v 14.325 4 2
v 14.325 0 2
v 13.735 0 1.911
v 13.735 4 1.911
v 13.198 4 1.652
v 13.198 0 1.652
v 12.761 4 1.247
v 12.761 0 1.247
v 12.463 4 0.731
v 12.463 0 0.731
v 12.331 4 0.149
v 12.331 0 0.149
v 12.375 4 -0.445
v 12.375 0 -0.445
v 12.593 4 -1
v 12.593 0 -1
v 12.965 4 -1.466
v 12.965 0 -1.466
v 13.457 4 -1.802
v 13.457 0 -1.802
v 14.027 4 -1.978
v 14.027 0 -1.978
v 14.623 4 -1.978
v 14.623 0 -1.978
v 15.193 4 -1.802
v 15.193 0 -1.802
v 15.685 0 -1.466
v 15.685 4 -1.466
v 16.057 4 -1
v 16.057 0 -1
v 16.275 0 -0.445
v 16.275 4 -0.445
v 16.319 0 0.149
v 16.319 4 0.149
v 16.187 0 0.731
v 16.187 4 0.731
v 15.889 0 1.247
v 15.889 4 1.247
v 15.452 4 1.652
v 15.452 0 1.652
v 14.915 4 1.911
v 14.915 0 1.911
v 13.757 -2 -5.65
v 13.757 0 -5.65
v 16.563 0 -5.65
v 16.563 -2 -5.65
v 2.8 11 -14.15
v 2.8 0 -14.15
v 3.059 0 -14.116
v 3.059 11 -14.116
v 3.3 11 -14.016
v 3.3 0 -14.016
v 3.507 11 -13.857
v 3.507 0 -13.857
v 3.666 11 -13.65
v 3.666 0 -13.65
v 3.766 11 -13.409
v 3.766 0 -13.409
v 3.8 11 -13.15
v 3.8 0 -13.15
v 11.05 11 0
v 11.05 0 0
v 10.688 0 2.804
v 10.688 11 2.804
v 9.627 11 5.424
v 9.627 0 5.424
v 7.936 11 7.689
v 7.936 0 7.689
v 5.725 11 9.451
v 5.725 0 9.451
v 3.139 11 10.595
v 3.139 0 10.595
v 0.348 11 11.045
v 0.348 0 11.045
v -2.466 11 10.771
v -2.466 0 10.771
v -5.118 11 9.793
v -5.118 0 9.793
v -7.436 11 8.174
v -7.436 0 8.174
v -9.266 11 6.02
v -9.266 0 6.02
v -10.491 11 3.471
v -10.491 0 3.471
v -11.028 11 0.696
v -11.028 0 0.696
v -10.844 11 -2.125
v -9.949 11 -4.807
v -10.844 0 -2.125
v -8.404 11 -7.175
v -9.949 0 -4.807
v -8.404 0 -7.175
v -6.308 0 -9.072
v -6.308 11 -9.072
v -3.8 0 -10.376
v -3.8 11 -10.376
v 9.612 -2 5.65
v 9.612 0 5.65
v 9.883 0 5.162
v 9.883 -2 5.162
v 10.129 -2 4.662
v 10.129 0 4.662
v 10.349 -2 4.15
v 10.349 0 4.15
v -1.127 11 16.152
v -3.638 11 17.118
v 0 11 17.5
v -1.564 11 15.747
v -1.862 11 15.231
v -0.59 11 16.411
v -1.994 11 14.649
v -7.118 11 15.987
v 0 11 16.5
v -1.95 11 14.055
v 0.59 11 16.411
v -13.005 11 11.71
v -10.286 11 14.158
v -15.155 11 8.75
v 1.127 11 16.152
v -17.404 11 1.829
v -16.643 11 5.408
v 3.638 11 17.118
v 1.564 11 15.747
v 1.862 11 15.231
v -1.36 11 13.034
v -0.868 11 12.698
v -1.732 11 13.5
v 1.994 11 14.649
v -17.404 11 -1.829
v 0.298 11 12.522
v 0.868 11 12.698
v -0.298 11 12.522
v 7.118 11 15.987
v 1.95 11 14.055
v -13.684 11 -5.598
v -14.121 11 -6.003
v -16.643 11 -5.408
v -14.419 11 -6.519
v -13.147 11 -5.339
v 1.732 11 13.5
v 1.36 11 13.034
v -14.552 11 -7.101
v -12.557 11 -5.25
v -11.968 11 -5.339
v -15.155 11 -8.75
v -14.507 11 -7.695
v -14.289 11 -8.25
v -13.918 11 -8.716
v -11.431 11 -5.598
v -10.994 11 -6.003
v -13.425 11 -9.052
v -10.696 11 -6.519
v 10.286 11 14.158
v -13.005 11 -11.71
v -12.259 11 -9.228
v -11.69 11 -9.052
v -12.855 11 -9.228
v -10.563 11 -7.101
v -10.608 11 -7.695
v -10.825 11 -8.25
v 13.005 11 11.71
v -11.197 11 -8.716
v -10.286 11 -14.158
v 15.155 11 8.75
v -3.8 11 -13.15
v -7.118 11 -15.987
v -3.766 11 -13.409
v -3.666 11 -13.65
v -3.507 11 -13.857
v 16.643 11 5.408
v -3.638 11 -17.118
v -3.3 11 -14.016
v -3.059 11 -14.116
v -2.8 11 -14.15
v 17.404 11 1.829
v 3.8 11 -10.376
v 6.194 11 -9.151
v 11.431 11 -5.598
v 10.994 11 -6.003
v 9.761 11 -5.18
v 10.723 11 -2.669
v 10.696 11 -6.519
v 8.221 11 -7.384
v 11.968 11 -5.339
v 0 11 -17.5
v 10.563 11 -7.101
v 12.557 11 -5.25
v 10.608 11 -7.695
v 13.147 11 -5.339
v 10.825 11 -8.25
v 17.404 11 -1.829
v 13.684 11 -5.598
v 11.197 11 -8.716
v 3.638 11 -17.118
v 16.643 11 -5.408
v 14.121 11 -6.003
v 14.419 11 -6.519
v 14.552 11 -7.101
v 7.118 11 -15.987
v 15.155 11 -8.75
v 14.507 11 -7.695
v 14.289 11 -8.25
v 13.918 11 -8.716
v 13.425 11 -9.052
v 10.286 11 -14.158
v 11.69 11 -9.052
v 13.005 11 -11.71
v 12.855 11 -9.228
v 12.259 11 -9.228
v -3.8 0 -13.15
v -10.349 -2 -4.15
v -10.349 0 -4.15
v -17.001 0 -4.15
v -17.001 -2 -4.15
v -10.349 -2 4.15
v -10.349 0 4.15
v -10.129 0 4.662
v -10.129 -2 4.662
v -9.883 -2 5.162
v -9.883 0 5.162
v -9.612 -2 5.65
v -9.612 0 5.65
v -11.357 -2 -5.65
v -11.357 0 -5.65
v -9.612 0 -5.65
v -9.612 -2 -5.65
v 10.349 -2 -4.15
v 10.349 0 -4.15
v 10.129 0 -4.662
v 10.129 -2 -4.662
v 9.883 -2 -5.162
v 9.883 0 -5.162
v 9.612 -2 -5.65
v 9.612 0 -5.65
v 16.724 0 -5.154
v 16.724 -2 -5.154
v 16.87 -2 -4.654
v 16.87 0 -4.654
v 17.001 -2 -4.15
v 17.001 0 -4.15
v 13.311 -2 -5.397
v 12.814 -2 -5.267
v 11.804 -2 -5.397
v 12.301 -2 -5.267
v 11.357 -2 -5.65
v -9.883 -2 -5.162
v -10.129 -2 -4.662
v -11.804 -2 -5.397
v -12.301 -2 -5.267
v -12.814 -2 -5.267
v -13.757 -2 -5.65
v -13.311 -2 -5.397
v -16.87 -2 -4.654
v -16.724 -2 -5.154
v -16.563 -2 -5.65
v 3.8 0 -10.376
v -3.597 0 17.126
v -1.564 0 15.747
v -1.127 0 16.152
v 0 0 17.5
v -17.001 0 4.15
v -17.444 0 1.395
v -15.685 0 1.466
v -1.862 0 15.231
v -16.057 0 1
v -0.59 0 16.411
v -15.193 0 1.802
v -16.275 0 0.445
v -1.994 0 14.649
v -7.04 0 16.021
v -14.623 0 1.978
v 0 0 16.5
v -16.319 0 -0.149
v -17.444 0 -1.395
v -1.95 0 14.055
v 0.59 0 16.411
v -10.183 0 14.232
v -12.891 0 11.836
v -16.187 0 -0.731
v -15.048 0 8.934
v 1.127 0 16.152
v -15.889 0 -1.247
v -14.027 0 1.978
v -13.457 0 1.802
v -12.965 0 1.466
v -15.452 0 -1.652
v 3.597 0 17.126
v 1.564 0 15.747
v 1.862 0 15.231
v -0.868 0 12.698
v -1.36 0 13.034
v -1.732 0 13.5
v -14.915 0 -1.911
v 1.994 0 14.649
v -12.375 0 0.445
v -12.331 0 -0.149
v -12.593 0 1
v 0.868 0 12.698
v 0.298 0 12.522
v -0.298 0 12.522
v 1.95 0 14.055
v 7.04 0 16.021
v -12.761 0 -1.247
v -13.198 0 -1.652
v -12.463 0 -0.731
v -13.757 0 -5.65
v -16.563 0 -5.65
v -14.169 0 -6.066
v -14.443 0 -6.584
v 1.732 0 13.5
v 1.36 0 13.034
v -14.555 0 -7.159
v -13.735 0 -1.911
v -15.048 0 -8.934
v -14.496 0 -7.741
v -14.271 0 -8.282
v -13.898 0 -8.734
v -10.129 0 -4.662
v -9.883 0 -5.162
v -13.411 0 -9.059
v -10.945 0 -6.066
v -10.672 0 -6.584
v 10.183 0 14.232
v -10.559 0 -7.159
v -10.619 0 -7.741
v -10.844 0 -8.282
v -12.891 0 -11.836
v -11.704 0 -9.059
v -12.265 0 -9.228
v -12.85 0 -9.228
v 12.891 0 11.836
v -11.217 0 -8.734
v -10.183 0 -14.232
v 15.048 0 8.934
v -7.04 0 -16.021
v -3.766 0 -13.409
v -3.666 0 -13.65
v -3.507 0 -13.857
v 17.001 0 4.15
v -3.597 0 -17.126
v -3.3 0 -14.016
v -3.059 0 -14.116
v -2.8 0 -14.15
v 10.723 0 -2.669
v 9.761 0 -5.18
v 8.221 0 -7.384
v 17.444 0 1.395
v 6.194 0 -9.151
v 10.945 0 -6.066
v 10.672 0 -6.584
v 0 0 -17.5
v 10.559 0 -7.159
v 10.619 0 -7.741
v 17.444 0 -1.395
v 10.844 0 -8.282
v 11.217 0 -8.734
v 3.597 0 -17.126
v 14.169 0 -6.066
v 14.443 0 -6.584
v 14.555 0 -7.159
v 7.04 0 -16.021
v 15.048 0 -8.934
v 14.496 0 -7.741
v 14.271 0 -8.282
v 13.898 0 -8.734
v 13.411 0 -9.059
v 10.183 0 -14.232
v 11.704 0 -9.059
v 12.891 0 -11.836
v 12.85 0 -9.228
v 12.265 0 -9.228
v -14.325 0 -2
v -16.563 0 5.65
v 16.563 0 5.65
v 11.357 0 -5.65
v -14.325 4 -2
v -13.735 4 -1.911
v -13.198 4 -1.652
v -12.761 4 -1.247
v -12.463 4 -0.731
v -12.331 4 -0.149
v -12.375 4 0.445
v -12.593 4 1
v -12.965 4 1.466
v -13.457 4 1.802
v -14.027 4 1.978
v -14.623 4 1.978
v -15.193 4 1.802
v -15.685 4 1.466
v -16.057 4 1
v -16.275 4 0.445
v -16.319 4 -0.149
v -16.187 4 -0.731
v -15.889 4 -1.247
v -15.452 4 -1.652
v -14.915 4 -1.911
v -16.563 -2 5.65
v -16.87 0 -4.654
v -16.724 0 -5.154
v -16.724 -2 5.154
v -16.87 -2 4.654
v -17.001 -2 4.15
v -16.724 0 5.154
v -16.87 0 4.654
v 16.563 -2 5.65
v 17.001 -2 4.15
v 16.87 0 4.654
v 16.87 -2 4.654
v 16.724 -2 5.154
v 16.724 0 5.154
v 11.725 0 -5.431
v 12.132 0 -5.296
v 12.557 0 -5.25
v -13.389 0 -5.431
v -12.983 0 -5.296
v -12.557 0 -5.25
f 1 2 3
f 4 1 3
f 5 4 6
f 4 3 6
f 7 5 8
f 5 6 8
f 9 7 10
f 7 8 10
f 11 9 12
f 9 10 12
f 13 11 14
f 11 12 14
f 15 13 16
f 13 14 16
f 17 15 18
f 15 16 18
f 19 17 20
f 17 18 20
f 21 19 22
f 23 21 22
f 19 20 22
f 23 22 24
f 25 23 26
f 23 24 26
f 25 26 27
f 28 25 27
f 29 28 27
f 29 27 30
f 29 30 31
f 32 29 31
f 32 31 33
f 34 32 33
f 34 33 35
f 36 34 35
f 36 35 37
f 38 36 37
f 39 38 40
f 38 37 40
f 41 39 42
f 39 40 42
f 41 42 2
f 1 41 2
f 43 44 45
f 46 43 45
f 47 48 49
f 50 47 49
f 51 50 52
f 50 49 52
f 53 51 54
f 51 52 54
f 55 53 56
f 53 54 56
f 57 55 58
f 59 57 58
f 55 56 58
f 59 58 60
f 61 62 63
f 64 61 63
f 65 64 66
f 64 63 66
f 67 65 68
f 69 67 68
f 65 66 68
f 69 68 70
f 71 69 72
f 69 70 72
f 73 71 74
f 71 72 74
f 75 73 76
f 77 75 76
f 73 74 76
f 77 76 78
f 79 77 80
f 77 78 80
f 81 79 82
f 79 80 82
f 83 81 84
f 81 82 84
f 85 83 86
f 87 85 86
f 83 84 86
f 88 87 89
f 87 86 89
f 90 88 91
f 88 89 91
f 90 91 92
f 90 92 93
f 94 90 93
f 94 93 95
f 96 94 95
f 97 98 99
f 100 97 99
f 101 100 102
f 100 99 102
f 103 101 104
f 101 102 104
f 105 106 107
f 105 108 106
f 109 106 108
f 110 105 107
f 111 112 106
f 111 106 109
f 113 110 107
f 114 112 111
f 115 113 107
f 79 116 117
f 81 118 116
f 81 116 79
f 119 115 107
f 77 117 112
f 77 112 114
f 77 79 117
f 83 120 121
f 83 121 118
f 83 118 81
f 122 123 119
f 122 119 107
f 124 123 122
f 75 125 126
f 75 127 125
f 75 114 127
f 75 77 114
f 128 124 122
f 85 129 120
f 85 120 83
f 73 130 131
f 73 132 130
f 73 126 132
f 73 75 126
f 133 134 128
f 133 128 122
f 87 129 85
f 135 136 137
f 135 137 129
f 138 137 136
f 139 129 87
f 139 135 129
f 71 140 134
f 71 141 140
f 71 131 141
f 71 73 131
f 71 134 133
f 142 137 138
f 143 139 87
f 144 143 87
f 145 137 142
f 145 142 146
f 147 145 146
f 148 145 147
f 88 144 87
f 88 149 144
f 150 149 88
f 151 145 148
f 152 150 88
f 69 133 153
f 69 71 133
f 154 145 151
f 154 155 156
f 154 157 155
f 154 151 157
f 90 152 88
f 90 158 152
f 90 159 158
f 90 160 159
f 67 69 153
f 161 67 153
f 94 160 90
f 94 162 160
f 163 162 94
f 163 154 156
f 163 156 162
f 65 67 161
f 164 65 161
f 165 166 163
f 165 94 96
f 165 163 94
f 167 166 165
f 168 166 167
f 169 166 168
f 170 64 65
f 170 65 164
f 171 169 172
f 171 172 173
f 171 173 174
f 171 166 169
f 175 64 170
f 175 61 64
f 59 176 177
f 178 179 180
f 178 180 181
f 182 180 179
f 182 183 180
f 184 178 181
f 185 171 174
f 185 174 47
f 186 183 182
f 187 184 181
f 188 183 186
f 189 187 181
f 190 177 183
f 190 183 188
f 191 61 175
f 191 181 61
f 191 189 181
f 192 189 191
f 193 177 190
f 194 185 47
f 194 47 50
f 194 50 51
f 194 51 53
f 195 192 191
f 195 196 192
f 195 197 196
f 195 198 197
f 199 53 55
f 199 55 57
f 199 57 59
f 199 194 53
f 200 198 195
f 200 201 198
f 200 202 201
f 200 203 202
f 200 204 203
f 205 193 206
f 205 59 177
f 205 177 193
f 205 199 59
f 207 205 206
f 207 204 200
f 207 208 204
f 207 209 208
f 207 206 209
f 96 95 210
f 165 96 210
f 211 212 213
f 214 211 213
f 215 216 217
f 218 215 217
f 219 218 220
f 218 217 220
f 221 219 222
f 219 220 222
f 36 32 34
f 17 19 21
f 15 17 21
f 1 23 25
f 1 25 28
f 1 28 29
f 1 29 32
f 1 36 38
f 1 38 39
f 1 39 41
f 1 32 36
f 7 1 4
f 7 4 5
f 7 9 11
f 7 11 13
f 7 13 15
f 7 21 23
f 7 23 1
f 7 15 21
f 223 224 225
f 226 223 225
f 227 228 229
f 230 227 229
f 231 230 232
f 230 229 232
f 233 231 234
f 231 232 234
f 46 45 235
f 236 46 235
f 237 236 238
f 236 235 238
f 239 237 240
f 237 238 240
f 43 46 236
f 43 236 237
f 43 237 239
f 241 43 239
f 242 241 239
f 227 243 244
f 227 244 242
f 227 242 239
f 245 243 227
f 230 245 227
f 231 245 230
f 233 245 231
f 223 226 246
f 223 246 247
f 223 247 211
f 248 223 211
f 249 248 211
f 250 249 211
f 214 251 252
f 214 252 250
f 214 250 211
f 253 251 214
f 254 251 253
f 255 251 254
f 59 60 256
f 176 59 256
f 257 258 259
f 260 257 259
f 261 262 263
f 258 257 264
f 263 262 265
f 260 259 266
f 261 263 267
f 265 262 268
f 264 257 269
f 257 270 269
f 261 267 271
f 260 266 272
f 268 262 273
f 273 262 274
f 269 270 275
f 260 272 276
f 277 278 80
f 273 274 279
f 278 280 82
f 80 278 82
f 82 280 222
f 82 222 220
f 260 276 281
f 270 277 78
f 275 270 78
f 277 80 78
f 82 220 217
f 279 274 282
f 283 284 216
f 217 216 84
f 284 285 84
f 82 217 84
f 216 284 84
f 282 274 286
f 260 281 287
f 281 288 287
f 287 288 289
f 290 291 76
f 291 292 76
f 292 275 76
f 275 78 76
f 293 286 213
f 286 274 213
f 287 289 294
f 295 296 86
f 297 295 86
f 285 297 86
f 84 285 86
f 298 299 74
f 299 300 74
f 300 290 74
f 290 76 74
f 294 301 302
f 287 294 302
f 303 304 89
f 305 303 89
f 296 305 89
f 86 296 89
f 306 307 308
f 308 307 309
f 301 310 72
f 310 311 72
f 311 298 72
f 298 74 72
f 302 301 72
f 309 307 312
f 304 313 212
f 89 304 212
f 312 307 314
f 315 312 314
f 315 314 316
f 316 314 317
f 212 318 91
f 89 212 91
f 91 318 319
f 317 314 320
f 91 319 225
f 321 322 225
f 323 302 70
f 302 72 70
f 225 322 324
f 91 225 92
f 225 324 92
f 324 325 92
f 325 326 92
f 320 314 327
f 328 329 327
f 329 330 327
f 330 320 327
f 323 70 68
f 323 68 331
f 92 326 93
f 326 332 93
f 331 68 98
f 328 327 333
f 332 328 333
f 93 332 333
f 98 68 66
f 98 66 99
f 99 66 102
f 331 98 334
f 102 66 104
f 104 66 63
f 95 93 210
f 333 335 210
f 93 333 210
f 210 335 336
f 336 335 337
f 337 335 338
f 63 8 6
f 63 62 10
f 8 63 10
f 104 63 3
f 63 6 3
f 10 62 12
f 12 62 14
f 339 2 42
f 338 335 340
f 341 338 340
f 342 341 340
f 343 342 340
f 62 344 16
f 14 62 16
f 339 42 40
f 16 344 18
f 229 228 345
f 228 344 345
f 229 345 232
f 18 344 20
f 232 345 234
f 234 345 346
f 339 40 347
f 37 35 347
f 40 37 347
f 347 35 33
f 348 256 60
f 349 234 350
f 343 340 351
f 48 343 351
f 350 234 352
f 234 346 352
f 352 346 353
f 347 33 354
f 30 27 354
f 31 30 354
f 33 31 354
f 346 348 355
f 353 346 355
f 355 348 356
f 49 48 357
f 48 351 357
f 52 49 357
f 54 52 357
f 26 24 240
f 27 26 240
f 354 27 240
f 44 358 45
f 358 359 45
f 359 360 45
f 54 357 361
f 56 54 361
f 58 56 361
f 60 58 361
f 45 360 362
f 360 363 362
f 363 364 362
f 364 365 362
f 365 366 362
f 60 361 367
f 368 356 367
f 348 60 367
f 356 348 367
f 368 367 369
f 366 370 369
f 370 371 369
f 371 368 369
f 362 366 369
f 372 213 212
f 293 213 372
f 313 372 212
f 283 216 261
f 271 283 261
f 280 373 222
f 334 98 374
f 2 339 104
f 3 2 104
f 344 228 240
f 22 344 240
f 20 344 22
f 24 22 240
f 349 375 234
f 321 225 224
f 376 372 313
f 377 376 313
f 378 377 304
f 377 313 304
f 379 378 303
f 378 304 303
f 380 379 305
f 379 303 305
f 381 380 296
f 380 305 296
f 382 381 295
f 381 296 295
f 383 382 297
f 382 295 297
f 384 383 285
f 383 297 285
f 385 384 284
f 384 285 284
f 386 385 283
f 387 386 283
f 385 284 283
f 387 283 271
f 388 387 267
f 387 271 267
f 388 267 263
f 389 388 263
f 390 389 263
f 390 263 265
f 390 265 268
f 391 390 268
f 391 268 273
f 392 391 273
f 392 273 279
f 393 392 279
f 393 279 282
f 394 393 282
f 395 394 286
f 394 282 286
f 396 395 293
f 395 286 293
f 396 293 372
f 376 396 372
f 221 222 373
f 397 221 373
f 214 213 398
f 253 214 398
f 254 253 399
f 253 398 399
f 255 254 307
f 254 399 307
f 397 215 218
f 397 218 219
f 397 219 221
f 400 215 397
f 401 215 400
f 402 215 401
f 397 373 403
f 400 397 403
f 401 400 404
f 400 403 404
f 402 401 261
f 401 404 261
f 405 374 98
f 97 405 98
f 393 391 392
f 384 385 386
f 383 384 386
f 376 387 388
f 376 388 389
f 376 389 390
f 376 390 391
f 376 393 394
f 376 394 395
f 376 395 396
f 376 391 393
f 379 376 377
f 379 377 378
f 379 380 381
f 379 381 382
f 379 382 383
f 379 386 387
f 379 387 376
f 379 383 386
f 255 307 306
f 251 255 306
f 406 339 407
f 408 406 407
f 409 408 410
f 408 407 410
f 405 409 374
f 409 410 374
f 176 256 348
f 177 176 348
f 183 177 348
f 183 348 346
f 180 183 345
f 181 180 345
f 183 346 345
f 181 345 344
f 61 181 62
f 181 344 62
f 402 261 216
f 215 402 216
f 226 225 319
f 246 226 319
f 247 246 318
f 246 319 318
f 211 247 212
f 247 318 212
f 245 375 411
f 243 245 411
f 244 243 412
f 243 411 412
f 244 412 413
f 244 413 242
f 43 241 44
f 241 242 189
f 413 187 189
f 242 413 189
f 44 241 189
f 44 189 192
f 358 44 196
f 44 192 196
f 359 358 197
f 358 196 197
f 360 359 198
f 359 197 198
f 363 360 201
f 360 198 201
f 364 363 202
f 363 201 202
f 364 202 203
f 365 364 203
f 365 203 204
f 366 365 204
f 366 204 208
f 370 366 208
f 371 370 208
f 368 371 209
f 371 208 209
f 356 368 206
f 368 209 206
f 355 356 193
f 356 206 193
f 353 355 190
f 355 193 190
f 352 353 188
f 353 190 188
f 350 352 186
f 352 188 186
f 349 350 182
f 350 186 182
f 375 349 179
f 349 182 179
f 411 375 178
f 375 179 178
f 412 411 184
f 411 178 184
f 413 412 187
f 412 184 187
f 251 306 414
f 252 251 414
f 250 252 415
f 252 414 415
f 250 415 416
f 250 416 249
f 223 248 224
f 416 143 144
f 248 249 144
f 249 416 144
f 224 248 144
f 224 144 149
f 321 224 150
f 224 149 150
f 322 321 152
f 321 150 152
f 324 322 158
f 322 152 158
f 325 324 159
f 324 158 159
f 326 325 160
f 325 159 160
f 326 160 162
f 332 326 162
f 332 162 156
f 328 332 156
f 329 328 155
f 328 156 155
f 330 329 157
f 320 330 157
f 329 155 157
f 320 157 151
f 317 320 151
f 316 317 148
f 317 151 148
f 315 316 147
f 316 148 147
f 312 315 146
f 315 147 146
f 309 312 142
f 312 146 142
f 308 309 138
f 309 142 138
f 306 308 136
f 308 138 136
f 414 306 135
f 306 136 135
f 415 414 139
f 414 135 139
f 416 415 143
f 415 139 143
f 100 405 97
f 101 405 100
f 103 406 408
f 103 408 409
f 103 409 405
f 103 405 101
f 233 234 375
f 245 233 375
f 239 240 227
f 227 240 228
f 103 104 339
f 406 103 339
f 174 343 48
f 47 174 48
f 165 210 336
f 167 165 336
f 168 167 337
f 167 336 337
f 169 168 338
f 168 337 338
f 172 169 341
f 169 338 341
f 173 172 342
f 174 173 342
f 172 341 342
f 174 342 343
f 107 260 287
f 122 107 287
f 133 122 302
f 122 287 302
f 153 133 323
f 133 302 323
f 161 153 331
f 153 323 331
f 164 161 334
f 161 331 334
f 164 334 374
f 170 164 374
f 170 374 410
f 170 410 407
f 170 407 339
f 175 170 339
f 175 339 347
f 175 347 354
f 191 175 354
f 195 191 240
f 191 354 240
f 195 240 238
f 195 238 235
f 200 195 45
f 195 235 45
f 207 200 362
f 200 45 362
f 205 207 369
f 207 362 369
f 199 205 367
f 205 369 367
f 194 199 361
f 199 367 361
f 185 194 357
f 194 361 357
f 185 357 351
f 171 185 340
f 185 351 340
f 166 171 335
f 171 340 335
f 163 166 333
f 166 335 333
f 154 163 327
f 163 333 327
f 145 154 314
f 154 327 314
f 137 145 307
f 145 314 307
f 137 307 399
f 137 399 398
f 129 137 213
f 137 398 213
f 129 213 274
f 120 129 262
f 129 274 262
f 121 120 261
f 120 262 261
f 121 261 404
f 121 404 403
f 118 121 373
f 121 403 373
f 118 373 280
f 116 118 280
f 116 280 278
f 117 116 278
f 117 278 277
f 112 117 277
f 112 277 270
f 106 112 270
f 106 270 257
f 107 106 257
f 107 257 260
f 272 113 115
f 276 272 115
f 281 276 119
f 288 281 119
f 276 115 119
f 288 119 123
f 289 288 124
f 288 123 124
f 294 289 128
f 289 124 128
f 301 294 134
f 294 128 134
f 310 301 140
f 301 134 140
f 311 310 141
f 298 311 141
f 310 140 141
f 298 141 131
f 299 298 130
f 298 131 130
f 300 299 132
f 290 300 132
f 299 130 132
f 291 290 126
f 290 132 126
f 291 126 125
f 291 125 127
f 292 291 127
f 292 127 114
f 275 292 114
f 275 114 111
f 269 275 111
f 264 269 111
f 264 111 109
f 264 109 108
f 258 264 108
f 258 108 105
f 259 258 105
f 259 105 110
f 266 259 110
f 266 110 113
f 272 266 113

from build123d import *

# Parameters (mm, degrees)
CROQUIS1_R              = 17.5
SALIENTE_EXTRUIR1_DEPTH = 11
CROQUIS4_R              = 2
CORTAR_EXTRUIR2_DEPTH   = 28.083205128
CROQUIS6_R              = 2
CORTAR_EXTRUIR3_DEPTH   = 4
SALIENTE_EXTRUIR3_DEPTH = 2
SALIENTE_EXTRUIR4_START = -11
SALIENTE_EXTRUIR4_DEPTH = 11


# Read off the part's stored shape, not the designer's step: Saliente-Extruir3
with BuildPart() as part:
    # Croquis1 → Saliente-Extruir1 (new body)
    with BuildSketch(Plane(origin=(0, 0, 0), x_dir=(1, 0, 0), z_dir=(0, 1, 0))):
        with Locations(Location((0, 0, 0), (0, 0, 270))):
            Circle(CROQUIS1_R)
        with BuildLine():
            ThreePointArc((11.15, 0), (-6.401269405, -9.129416739), (-3.8, 10.482485392))
            Line((-3.8, 10.482485392), (-3.8, 13.15))
            ThreePointArc((-3.8, 13.15), (-3.507106781, 13.857106781), (-2.8, 14.15))
            Line((-2.8, 14.15), (2.8, 14.15))
            ThreePointArc((2.8, 14.15), (3.507106781, 13.857106781), (3.8, 13.15))
            Line((3.8, 13.15), (3.8, 10.482485392))
            ThreePointArc((3.8, 10.482485392), (9.129416739, 6.401269405), (11.15, 0))
        make_face(mode=Mode.SUBTRACT)
    extrude(amount=SALIENTE_EXTRUIR1_DEPTH)

    # Croquis4 → Cortar-Extruir2 (cut, through all)
    with BuildSketch(Plane(origin=(0, 11, 0), x_dir=(1, 0, 0), z_dir=(0, 1, 0))):
        with Locations(Location((-12.557368355, 7.25, 0), (0, 0, 270))):
            Circle(CROQUIS4_R)
        with Locations(Location((12.557368355, 7.25, 0), (0, 0, 270))):
            Circle(CROQUIS4_R)
        with Locations(Location((0, -14.5, 0), (0, 0, 270))):
            Circle(CROQUIS4_R)
    extrude(amount=-CORTAR_EXTRUIR2_DEPTH, mode=Mode.SUBTRACT)

    # Croquis6 → Cortar-Extruir3 (cut)
    with BuildSketch(Plane(origin=(0, 0, 0), x_dir=(-1, 0, 0), z_dir=(0, -1, 0))):
        with Locations(Location((14.325, 0, 0), (0, 0, 90))):
            Circle(CROQUIS6_R)
        with Locations(Location((-14.325, 0, 0), (0, 0, 270))):
            Circle(CROQUIS6_R)
    extrude(amount=-CORTAR_EXTRUIR3_DEPTH, mode=Mode.SUBTRACT)

    # Saliente-Extruir3 outline → Saliente-Extruir3 (add)
    with BuildSketch(Plane(origin=(0, 0, 0), x_dir=(-1, 0, 0), z_dir=(0, -1, 0))):
        with BuildLine():
            ThreePointArc((-10.348912986, 4.15), (-10.00884214, 4.913815118), (-9.612491872, 5.65))
            Line((-9.612491872, 5.65), (-11.357368355, 5.65))
            ThreePointArc((-11.357368355, 5.65), (-12.557368355, 5.25), (-13.757368355, 5.65))
            Line((-13.757368355, 5.65), (-16.562834902, 5.65))
            ThreePointArc((-16.562834902, 5.65), (-16.798572699, 4.904890956), (-17.000808804, 4.15))
            Line((-17.000808804, 4.15), (-10.348912986, 4.15))
        make_face()
        with BuildLine():
            ThreePointArc((-9.612491873, -5.65), (-10.00884214, -4.913815118), (-10.348912986, -4.15))
            Line((-10.348912986, -4.15), (-17.000808804, -4.15))
            ThreePointArc((-17.000808804, -4.15), (-16.798572699, -4.904890956), (-16.562834902, -5.65))
            Line((-16.562834902, -5.65), (-9.612491873, -5.65))
        make_face()
        with BuildLine():
            ThreePointArc((10.348912986, -4.15), (10.00884214, -4.913815118), (9.612491873, -5.65))
            Line((9.612491873, -5.65), (16.562834902, -5.65))
            ThreePointArc((16.562834902, -5.65), (16.798572699, -4.904890956), (17.000808804, -4.15))
            Line((17.000808804, -4.15), (10.348912986, -4.15))
        make_face()
        with BuildLine():
            ThreePointArc((17.000808804, 4.15), (16.798572699, 4.904890956), (16.562834902, 5.65))
            Line((16.562834902, 5.65), (13.757368355, 5.65))
            ThreePointArc((13.757368355, 5.65), (12.557368355, 5.25), (11.357368355, 5.65))
            Line((11.357368355, 5.65), (9.612491872, 5.65))
            ThreePointArc((9.612491872, 5.65), (10.00884214, 4.913815118), (10.348912986, 4.15))
            Line((10.348912986, 4.15), (17.000808804, 4.15))
        make_face()
    extrude(amount=SALIENTE_EXTRUIR3_DEPTH)

    # Croquis11 → Saliente-Extruir4 (add)
    with BuildSketch(Plane(origin=(0, 11, 0), x_dir=(1, 0, 0), z_dir=(0, 1, 0)).offset(SALIENTE_EXTRUIR4_START)):
        with BuildLine():
            Line((-3.8, 10.376054163), (-3.8, 10.482485392))
            ThreePointArc((-3.8, 10.482485392), (-6.401269405, -9.129416739), (11.15, 0))
            ThreePointArc((11.15, 0), (9.129416739, 6.401269405), (3.8, 10.482485392))
            Line((3.8, 10.482485392), (3.8, 10.376054163))
            ThreePointArc((3.8, 10.376054163), (9.057938507, 6.329000711), (11.05, 0))
            ThreePointArc((11.05, 0), (-6.329000711, -9.057938507), (-3.8, 10.376054163))
        make_face()
    extrude(amount=SALIENTE_EXTRUIR4_DEPTH)


solid = part.part
